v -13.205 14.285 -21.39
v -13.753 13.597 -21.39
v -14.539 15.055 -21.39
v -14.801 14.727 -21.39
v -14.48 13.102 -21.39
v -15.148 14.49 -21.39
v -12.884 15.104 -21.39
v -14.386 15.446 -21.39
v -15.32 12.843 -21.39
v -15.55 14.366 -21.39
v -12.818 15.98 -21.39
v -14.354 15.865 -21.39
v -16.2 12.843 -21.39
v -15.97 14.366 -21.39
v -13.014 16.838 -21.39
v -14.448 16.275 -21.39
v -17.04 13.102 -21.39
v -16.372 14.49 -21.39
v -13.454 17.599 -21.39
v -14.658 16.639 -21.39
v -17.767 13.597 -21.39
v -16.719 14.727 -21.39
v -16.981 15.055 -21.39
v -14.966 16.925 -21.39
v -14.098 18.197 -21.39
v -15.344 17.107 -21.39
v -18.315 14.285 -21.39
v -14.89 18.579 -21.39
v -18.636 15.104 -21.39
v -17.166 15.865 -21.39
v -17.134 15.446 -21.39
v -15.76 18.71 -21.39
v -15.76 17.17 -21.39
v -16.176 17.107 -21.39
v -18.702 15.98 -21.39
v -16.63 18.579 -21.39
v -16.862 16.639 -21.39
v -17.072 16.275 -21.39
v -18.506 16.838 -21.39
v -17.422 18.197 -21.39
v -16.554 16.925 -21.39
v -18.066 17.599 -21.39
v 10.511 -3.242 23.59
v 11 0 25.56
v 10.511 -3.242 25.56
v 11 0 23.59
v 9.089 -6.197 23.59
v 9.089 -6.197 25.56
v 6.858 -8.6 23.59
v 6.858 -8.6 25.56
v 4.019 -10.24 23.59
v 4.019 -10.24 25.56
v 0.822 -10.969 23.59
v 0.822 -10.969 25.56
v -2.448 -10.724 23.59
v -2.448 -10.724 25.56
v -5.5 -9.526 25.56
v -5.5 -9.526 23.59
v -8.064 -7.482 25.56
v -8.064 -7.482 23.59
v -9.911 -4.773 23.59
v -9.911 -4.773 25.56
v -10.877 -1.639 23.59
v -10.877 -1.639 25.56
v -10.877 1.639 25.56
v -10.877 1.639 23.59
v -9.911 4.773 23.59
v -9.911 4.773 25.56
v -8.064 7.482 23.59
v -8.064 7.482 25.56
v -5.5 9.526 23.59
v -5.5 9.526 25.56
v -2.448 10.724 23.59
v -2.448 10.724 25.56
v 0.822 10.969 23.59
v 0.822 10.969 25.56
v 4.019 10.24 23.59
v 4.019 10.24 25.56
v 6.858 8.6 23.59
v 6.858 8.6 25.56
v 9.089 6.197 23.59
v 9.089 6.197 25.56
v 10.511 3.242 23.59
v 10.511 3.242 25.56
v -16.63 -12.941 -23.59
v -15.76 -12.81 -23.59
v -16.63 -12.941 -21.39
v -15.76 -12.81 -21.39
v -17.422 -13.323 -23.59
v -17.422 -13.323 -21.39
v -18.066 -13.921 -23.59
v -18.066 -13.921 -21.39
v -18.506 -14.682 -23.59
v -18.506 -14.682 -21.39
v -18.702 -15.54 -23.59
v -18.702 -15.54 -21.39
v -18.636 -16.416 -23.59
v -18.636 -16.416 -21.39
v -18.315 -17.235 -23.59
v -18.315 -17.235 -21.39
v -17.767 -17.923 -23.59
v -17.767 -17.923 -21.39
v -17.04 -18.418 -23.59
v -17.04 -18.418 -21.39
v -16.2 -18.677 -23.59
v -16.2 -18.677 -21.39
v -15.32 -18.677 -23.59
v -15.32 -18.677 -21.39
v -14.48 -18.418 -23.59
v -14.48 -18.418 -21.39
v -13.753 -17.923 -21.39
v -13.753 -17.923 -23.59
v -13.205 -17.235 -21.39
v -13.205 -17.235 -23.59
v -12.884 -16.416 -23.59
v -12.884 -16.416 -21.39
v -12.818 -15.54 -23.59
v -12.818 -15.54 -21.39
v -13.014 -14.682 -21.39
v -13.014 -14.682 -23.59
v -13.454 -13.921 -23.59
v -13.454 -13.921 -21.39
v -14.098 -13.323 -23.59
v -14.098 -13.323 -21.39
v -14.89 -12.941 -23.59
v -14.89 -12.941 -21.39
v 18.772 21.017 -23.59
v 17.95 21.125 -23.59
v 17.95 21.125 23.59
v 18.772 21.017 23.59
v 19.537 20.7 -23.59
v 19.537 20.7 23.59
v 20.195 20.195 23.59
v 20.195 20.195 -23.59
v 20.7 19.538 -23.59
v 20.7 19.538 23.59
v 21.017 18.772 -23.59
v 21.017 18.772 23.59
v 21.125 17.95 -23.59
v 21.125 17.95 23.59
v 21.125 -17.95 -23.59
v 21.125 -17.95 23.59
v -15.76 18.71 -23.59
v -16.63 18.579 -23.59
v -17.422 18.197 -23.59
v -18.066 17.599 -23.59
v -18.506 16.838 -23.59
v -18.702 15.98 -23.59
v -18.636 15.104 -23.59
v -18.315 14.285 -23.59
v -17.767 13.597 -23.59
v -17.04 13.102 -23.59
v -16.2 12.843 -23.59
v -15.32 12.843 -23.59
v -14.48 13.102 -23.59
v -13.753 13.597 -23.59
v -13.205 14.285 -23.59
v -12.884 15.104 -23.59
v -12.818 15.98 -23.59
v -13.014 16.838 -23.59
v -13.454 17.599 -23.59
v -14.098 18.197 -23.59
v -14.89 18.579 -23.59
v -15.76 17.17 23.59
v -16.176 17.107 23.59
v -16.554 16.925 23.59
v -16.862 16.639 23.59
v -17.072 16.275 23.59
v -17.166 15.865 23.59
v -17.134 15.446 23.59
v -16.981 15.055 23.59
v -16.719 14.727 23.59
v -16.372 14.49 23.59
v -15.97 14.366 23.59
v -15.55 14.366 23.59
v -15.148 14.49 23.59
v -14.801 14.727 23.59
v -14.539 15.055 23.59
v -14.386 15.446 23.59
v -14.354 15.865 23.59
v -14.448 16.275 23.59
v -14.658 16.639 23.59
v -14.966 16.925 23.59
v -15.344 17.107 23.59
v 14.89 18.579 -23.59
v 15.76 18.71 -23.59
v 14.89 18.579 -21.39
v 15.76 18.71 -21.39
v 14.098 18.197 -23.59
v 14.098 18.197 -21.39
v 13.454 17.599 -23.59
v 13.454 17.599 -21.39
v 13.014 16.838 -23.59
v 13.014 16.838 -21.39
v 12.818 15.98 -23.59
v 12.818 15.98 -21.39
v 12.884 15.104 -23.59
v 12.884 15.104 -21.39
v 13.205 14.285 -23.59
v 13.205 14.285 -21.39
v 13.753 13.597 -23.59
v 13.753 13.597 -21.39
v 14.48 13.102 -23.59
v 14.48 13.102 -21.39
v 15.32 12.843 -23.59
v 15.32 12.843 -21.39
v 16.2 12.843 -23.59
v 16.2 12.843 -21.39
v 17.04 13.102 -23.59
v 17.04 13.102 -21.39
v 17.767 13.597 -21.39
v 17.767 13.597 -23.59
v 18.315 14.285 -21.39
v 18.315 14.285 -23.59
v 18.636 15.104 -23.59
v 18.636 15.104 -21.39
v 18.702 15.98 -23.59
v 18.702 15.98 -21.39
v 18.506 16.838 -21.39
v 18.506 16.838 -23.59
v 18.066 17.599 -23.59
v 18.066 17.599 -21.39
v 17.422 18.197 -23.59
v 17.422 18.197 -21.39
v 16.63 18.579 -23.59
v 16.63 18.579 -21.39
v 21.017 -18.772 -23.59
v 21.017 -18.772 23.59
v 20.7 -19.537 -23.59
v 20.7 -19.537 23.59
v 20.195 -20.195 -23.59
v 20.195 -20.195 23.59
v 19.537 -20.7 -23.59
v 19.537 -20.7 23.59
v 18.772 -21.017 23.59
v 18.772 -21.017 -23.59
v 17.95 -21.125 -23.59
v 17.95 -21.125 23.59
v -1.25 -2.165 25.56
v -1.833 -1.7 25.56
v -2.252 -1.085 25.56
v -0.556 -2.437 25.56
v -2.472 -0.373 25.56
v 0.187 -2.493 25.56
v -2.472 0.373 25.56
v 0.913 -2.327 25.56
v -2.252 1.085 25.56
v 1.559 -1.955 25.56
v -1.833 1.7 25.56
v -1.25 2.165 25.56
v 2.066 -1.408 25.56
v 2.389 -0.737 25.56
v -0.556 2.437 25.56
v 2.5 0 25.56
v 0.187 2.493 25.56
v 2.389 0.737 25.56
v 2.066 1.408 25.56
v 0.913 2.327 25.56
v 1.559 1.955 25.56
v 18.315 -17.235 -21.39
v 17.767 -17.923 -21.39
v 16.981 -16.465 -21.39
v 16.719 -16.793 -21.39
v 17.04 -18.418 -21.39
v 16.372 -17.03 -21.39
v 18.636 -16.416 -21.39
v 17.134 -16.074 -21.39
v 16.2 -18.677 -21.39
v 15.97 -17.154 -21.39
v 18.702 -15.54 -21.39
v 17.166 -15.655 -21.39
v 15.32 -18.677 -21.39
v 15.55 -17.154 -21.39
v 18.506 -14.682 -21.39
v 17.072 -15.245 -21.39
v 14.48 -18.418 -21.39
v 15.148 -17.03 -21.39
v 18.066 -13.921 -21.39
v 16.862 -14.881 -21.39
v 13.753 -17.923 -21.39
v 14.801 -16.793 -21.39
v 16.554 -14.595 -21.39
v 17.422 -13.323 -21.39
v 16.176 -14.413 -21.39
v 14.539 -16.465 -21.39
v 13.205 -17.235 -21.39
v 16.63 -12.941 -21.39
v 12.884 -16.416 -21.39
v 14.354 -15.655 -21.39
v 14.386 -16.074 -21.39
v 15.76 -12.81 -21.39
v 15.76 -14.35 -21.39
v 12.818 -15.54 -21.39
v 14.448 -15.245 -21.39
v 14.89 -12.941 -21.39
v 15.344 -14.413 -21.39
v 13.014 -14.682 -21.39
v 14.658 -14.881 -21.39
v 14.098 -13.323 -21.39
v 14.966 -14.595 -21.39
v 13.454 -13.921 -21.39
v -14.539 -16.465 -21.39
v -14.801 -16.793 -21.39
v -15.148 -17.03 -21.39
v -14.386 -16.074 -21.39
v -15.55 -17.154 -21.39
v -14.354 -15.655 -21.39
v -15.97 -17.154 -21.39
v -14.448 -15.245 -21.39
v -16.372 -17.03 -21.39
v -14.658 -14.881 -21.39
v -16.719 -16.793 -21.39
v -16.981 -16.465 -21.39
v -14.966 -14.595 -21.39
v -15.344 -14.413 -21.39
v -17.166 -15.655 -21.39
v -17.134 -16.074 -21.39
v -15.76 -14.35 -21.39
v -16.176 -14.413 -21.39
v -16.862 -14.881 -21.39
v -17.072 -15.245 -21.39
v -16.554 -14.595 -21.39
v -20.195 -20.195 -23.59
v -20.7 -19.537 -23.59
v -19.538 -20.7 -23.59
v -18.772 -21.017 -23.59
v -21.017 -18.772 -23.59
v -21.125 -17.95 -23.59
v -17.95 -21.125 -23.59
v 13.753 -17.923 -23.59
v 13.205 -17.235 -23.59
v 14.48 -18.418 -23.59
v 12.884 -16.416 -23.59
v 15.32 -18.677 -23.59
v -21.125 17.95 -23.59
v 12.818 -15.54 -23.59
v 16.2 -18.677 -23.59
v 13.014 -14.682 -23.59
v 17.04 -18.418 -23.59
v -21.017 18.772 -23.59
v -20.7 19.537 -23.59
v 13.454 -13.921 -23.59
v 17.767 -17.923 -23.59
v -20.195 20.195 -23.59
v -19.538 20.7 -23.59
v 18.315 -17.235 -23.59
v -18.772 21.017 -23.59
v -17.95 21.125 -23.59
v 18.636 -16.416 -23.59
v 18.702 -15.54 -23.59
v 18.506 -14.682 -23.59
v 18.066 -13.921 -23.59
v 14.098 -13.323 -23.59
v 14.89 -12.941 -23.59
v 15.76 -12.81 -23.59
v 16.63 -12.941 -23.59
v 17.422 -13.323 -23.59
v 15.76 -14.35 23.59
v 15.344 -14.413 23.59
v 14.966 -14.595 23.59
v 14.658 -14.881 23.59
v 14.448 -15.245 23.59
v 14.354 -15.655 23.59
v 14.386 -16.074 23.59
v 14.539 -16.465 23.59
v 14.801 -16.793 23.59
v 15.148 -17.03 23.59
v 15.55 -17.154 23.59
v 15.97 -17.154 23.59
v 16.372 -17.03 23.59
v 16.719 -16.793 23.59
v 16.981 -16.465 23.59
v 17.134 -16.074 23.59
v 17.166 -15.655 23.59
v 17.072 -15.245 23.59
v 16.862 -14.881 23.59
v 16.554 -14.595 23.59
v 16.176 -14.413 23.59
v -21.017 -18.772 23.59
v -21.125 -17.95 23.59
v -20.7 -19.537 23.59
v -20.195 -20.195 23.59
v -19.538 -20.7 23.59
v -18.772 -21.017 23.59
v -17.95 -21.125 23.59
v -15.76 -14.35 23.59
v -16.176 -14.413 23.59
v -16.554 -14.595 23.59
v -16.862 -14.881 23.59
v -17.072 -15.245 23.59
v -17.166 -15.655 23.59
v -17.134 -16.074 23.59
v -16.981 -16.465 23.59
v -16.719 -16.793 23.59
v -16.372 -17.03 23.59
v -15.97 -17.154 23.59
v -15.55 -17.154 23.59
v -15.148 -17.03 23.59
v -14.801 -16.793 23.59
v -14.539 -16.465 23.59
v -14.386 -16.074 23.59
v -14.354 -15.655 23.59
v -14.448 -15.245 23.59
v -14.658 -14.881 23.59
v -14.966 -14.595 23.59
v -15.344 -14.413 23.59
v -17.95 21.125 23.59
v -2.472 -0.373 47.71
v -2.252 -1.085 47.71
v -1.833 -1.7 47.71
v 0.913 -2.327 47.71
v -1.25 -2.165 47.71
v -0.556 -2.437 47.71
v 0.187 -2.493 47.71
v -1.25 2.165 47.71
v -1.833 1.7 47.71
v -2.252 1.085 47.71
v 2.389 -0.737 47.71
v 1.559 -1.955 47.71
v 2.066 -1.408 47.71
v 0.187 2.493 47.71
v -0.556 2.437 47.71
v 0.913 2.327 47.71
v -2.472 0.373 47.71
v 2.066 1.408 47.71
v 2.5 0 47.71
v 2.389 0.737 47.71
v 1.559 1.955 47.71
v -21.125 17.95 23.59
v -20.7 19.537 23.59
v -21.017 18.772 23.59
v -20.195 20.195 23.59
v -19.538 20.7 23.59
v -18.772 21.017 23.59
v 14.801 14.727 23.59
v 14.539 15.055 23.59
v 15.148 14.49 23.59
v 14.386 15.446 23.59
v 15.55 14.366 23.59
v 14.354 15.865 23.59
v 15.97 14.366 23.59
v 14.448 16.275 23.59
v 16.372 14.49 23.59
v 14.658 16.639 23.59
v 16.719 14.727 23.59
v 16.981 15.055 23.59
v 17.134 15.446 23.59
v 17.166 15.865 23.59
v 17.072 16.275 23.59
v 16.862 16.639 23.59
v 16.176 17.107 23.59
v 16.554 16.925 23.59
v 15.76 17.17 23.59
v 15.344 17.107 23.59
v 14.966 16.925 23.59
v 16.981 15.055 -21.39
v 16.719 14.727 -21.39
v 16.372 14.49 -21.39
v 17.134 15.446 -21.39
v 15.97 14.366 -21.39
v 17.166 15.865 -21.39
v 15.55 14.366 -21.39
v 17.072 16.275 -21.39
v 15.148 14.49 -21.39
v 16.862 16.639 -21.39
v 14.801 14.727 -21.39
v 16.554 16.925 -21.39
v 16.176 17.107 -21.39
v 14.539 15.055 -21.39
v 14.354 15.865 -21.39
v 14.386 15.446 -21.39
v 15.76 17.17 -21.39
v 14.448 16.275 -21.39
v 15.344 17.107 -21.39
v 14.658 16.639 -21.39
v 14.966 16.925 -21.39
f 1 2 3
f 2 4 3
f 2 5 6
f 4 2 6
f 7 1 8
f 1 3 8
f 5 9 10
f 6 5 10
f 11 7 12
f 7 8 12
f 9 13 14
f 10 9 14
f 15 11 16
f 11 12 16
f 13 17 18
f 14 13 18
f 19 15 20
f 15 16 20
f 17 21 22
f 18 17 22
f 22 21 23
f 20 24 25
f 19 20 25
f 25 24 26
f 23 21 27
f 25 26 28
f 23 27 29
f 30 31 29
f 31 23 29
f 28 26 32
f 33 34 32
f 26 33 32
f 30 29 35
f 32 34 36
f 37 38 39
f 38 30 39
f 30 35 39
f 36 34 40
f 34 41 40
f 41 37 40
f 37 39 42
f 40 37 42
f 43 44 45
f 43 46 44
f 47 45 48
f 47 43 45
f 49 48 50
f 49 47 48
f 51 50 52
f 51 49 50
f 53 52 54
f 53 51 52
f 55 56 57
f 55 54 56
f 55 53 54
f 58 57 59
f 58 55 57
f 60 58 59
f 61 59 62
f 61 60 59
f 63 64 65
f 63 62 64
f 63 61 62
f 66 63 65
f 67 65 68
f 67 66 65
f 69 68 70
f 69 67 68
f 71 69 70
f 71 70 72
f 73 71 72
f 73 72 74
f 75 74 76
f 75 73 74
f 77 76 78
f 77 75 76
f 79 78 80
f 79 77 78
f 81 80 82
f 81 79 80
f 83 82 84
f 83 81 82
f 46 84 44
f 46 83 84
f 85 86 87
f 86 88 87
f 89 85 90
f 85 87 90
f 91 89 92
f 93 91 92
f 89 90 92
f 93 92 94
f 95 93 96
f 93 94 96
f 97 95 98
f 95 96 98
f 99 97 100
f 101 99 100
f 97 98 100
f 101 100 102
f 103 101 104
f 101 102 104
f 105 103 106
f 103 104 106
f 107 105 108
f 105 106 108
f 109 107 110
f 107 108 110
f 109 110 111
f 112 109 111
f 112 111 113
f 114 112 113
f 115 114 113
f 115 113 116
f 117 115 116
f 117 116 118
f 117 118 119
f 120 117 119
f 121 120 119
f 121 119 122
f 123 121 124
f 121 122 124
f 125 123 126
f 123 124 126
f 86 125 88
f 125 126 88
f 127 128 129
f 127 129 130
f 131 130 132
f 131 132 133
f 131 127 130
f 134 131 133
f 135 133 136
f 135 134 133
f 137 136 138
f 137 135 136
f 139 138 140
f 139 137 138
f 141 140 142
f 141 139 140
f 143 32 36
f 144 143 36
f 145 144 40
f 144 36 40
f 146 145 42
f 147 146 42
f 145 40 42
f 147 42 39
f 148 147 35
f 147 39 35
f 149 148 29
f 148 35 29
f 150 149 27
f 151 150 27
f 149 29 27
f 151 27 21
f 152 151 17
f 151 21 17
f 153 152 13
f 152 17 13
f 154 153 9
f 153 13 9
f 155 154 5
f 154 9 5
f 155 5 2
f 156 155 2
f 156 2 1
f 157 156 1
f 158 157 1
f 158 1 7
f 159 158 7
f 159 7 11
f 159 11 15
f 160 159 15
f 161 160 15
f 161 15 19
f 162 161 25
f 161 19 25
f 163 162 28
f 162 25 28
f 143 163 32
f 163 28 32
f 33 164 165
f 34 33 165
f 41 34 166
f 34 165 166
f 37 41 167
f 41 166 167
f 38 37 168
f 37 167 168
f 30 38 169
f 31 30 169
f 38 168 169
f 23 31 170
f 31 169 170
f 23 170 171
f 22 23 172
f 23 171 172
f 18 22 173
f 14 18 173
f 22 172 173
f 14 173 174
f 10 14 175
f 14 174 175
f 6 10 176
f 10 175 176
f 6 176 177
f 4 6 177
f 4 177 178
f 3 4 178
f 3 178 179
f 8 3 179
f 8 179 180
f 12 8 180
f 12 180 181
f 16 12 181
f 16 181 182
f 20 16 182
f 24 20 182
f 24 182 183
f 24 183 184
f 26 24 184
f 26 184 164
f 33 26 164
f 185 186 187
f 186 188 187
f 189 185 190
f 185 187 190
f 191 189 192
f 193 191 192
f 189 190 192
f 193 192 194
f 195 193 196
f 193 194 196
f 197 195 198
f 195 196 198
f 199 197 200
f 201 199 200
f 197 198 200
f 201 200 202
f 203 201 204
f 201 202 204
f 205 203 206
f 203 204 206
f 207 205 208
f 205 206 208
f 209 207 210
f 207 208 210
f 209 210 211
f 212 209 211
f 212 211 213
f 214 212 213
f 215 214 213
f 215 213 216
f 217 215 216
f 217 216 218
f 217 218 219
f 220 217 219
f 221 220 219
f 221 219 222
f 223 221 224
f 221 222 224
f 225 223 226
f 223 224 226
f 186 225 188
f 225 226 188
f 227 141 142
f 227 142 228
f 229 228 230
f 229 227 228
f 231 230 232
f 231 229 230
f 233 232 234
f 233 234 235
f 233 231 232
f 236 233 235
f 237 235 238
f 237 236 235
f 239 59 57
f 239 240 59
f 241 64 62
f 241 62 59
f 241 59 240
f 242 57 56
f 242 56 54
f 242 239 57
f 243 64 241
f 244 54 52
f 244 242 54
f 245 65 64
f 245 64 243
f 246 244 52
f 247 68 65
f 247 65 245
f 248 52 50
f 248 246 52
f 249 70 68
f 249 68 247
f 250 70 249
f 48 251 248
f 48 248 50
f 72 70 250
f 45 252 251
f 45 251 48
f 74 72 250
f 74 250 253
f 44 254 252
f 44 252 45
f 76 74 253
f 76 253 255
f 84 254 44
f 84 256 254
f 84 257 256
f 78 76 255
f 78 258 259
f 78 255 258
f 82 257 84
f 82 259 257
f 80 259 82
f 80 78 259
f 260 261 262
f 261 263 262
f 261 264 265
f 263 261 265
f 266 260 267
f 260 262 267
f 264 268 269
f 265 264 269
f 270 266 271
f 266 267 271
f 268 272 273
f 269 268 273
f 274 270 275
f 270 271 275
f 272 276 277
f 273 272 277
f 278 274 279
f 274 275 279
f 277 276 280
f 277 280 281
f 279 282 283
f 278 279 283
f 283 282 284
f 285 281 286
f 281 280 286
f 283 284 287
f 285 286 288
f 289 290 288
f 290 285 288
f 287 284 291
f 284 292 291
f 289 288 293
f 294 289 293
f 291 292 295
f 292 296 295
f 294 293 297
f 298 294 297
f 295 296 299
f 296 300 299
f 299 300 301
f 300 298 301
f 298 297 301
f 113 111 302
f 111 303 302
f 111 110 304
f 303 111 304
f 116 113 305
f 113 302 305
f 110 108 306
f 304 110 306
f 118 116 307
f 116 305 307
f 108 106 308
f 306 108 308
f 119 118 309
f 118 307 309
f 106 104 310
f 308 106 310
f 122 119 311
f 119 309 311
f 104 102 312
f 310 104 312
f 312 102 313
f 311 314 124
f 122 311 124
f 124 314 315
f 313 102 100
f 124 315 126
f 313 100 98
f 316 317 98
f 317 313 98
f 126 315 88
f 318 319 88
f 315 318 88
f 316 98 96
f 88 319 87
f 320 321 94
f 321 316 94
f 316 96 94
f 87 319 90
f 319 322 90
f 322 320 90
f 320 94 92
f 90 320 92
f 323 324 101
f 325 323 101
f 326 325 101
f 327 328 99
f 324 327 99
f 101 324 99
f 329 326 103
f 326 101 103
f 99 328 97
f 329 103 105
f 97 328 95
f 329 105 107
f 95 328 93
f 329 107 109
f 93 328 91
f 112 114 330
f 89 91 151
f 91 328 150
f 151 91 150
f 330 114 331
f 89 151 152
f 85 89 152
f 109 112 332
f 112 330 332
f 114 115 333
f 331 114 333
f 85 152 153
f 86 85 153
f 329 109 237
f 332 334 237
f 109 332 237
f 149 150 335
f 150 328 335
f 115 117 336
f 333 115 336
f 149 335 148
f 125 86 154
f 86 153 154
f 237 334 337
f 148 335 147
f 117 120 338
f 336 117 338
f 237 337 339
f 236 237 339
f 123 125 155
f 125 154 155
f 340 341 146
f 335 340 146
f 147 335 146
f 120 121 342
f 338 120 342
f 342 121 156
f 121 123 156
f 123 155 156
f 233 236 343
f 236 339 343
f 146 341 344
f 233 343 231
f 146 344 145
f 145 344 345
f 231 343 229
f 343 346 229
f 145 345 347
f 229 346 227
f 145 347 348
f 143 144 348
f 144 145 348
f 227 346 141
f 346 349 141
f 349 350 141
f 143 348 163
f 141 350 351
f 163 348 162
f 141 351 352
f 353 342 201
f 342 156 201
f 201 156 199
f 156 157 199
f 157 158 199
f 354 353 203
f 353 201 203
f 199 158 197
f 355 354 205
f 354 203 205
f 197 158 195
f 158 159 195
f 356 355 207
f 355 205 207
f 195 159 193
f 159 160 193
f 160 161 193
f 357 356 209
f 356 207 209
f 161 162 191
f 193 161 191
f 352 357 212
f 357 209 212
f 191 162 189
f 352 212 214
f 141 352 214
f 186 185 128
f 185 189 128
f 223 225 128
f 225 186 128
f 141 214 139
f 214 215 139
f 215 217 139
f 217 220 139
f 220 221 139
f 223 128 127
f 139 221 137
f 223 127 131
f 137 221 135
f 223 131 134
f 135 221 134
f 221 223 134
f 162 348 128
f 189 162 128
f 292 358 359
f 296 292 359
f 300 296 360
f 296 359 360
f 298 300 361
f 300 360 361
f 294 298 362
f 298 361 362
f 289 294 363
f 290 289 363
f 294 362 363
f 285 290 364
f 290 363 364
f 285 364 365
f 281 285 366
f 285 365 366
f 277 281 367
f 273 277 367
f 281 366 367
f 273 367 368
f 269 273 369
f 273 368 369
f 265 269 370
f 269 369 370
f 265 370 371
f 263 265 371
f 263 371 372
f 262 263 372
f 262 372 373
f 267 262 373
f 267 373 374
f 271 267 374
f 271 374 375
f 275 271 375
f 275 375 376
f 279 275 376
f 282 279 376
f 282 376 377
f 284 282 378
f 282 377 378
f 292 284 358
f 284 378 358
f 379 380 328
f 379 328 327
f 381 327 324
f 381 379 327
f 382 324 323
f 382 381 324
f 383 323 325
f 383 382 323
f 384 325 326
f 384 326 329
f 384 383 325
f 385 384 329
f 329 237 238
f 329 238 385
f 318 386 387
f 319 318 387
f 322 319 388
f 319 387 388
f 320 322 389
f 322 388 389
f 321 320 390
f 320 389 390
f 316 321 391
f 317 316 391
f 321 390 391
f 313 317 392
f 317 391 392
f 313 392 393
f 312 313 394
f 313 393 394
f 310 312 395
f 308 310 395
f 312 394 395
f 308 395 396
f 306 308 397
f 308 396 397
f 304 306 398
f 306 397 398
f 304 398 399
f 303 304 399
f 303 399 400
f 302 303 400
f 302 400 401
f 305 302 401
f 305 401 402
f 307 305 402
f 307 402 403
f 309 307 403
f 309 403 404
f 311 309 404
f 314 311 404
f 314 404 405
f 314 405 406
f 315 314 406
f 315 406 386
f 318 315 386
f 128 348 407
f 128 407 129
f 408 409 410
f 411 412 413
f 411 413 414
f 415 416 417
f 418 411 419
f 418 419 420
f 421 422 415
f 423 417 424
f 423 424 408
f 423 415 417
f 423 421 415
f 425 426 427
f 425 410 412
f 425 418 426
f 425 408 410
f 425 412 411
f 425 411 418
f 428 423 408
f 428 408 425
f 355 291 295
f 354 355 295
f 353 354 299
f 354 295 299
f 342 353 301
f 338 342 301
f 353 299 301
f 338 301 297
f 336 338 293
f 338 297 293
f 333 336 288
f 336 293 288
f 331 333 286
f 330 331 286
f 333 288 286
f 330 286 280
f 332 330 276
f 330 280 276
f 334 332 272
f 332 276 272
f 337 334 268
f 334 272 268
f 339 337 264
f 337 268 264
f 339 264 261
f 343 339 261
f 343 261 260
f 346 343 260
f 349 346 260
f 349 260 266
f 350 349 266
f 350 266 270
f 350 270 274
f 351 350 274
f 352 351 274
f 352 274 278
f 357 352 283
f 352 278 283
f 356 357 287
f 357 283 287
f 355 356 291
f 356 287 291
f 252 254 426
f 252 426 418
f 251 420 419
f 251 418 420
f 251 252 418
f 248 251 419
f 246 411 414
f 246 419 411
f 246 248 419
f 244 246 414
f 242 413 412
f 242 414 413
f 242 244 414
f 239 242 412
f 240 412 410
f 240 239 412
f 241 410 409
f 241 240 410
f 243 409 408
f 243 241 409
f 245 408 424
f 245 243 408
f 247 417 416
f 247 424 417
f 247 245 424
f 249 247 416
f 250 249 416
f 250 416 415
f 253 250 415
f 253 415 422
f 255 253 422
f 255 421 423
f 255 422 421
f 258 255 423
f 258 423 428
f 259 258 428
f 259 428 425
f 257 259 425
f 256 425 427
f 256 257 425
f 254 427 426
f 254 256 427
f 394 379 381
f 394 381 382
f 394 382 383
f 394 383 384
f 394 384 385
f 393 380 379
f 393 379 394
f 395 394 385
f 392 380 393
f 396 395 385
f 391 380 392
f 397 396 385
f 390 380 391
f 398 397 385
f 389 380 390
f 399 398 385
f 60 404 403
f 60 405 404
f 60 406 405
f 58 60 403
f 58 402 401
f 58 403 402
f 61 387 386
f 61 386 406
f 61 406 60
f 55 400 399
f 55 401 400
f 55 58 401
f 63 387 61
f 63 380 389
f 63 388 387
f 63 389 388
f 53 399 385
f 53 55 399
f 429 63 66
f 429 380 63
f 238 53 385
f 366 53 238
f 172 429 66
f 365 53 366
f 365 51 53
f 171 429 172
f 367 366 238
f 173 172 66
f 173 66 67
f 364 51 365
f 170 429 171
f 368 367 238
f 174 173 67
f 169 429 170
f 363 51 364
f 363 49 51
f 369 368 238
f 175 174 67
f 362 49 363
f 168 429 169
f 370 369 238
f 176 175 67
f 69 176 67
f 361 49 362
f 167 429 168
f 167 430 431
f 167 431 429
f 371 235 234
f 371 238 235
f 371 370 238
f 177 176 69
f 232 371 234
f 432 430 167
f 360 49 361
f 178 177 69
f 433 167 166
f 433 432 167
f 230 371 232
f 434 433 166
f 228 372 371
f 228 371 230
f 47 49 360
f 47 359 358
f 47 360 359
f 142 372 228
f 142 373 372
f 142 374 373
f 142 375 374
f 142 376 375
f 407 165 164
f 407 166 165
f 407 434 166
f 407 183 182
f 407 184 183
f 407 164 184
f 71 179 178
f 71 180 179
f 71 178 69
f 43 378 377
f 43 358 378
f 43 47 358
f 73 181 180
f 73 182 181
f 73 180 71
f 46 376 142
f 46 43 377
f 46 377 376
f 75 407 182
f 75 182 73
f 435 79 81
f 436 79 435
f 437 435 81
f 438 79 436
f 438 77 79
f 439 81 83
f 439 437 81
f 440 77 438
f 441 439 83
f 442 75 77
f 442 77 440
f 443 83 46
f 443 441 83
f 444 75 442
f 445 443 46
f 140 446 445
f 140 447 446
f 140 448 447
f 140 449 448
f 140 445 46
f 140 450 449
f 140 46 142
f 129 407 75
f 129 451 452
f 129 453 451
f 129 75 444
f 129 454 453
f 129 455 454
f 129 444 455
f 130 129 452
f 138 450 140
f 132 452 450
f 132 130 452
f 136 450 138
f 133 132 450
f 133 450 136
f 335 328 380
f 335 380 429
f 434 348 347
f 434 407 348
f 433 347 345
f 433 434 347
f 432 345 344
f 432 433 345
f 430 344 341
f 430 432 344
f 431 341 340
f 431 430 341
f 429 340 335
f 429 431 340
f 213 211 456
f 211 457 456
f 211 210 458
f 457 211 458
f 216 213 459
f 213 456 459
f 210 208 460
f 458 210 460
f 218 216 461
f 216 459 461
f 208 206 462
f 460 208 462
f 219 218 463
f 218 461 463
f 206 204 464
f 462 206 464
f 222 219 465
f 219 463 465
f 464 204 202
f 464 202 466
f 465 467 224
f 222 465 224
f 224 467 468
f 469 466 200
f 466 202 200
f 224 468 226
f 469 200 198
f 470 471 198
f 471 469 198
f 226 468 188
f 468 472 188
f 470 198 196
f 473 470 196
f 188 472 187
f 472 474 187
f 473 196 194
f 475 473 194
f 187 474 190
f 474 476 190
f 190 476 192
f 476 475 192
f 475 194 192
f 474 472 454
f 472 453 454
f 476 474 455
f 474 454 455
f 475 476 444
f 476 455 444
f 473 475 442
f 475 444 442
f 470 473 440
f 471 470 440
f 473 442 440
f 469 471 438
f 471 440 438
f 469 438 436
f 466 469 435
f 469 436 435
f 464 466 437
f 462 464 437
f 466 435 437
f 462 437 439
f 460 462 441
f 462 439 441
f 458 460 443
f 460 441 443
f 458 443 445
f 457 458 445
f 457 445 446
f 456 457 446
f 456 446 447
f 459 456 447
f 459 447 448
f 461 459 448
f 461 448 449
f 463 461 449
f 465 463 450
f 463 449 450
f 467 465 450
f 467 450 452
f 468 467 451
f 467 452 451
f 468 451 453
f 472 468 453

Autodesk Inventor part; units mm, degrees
ref_plane "YZ Plane" through (0, 0, 0) normal (1, 0, 0) x (0, 1, 0)
ref_plane "XZ Plane" through (0, 0, 0) normal (0, 1, 0) x (-1, 0, 0)
ref_plane "XY Plane" through (0, 0, 0) normal (0, 0, 1) x (1, 0, 0)
sketch "Sketch1" plane through (0, 0, 0) normal (0, 0, 1) x (1, 0, 0)
  line L0 (-21.125, 21.125) -> (21.125, 21.125)
  line L1 (21.125, 21.125) -> (21.125, -21.125)
  line L2 (21.125, -21.125) -> (-21.125, -21.125)
  line L3 (-21.125, -21.125) -> (-21.125, 21.125)
  line L4 (-21.125, 21.125) -> (21.125, -21.125) construction
  line L5 (21.125, 21.125) -> (-21.125, -21.125) construction
  point P0 (0, 0)
  dimension "d0" = 42.25
  dimension "d1" = 42.25
extrude "Extrusion1" add sketch "Sketch1" along normal mid plane 47.18
sketch "Sketch2" plane through (0, 0, 23.59) normal (0, 0, 1) x (1, 0, 0)
  circle A0 centre (0, 0) radius 11
  dimension "d4" = 22
extrude "Extrusion2" add sketch "Sketch2" along normal blind 1.97
fillet "Fillet1" radius 3.175 4 edges at (-21.125, 21.125, 0) (-21.125, -21.125, 0) (21.125, 21.125, 0) (21.125, -21.125, 0)
sketch "Sketch3" plane through (0, 0, 25.56) normal (0, 0, 1) x (1, 0, 0)
  circle A0 centre (0, 0) radius 2.5
  dimension "d8" = 5
extrude "Extrusion3" add sketch "Sketch3" along normal blind 22.15
sketch "Sketch4" plane through (0, 0, -23.59) normal (0, 0, -1) x (-1, 0, 0)
  circle A0 centre (-15.76, 15.76) radius 2.95
  circle A1 centre (15.76, 15.76) radius 2.95
  circle A2 centre (-15.76, -15.76) radius 2.95
  circle A3 centre (15.76, -15.76) radius 2.95
  line L0 (-21.125, 17.95) -> (-21.125, -17.95) projected
  line L1 (17.95, 21.125) -> (-17.95, 21.125) projected
  line L2 (21.125, -17.95) -> (21.125, 17.95) projected
  line L3 (-17.95, -21.125) -> (17.95, -21.125) projected
  point P0 (0, 0)
  dimension "d12" = 5.9
  dimension "d13" = 5.9
  dimension "d14" = 5.9
  dimension "d16" = 5.365
  dimension "d17" = 5.365
  dimension "d18" = 5.365
  dimension "d19" = 5.365
hole "Hole1" at (15.76, 15.76, -23.59) at (-15.76, 15.76, -23.59) at (-15.76, -15.76, -23.59) at (15.76, -15.76, -23.59) direction (0, 0, 1) diameter 5.9 depth 2.2
sketch "Sketch7" plane through (15.76, -15.76, -21.39) normal (0, 0, -1) x (-1, 0, 0)
  circle A0 centre (0, 0) radius 1.524
  point P0 (15.76, 15.76)
  dimension "d46" = 3.048
hole "Hole3" at (15.76, -15.76, -21.39) direction (0, 0, 1) diameter 2.8194 end through all thread size "6-40 UNF" class "2B" standard "ANSI Unified Screw Threads"
sketch "Sketch8" plane through (15.76, 15.76, -21.39) normal (0, 0, -1) x (-1, 0, 0)
  circle A0 centre (0, 0) radius 1.524
  point P0 (15.76, -15.76)
  dimension "d54" = 3.048
hole "Hole4" at (15.76, 15.76, -21.39) direction (0, 0, 1) diameter 2.8194 end through all thread size "6-40 UNF" class "2B" standard "ANSI Unified Screw Threads"
sketch "Sketch9" plane through (-15.76, -15.76, -21.39) normal (0, 0, -1) x (-1, 0, 0)
  circle A0 centre (0, 0) radius 1.524
  point P0 (-15.76, 15.76)
  dimension "d62" = 3.048
hole "Hole5" at (-15.76, -15.76, -21.39) direction (0, 0, 1) diameter 2.8194 end through all thread size "6-40 UNF" class "2B" standard "ANSI Unified Screw Threads"
sketch "Sketch10" plane through (-15.76, 15.76, -21.39) normal (0, 0, -1) x (-1, 0, 0)
  circle A0 centre (0, 0) radius 1.524
  point P0 (-15.76, -15.76)
  dimension "d70" = 3.048
hole "Hole6" at (-15.76, 15.76, -21.39) direction (0, 0, 1) diameter 2.8194 end through all thread size "6-40 UNF" class "2B" standard "ANSI Unified Screw Threads"
equation "\"d1\" = d0"
properties part number "CNC- Stepper Motor"
